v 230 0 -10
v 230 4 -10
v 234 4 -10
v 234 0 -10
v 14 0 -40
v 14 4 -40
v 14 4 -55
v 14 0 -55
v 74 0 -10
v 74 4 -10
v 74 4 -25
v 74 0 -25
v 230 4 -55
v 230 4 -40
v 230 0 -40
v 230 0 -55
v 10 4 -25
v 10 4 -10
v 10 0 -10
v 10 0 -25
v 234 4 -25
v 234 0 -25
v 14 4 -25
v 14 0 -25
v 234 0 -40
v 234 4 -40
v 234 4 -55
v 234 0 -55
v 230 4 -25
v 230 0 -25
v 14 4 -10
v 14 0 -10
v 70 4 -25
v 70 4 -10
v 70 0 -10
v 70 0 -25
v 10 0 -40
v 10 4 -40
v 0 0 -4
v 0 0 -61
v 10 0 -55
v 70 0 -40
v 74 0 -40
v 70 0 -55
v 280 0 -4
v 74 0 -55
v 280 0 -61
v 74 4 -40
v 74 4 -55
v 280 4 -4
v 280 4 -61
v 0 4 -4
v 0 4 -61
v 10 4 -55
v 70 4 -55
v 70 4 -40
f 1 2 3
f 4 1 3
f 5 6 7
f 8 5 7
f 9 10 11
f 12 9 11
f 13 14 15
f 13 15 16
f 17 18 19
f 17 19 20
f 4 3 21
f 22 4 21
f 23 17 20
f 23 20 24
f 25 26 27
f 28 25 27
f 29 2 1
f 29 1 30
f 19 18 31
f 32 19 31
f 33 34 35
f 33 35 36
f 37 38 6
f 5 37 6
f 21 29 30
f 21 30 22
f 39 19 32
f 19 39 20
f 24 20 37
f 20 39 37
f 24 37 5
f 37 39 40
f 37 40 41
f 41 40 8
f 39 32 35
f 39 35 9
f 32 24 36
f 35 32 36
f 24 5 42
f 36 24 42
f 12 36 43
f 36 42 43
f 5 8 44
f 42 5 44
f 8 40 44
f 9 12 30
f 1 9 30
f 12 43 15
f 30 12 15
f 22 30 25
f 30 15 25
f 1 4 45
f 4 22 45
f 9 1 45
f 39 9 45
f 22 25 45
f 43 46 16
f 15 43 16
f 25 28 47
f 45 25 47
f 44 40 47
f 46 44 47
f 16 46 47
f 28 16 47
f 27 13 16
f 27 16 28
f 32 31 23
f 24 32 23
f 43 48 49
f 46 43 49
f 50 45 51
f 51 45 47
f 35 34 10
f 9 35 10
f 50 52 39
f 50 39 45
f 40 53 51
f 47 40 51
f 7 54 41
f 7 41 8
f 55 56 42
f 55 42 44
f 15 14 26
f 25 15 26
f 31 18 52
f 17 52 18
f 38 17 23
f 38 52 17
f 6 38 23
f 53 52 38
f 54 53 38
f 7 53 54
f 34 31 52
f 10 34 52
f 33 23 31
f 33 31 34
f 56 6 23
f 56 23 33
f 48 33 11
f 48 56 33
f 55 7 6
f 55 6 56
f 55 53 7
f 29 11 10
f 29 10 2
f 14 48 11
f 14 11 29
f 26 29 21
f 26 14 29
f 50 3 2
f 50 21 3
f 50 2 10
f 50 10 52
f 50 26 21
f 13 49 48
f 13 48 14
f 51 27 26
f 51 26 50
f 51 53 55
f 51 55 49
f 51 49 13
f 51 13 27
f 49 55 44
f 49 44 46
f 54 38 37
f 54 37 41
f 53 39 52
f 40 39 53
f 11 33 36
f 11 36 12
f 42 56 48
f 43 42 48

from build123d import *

# Parameters (mm, degrees)
SKETCH1_W           = 280
SKETCH1_H           = 65
BOSS_EXTRUDE1_DEPTH = 4
SKETCH2_W           = 4
SKETCH2_H           = 15
CUT_EXTRUDE1_DEPTH  = 4
SKETCH3_W           = 280
SKETCH3_H           = 4
CUT_EXTRUDE2_DEPTH  = 4


with BuildPart() as part:
    # Sketch1 → Boss-Extrude1 (new body)
    with BuildSketch(Plane(origin=(0, 0, 0), x_dir=(1, 0, 0), z_dir=(0, 1, 0))):
        with Locations((140, 32.5)):
            Rectangle(SKETCH1_W, SKETCH1_H)
    extrude(amount=BOSS_EXTRUDE1_DEPTH)

    # Sketch2 → Cut-Extrude1 (cut)
    with BuildSketch(Plane(origin=(0, 4, 0), x_dir=(1, 0, 0), z_dir=(0, 1, 0))):
        with Locations((12, 47.5)):
            Rectangle(SKETCH2_W, SKETCH2_H)
        with Locations((12, 17.5)):
            Rectangle(SKETCH2_W, SKETCH2_H)
        with Locations((72, 17.5)):
            Rectangle(SKETCH2_W, SKETCH2_H)
        with Locations((72, 47.5)):
            Rectangle(SKETCH2_W, SKETCH2_H)
        with Locations((232, 47.5)):
            Rectangle(SKETCH2_W, SKETCH2_H)
        with Locations((232, 17.5)):
            Rectangle(SKETCH2_W, SKETCH2_H)
    extrude(amount=-CUT_EXTRUDE1_DEPTH, mode=Mode.SUBTRACT)

    # Sketch3 → Cut-Extrude2 (cut)
    with BuildSketch(Plane(origin=(0, 4, 0), x_dir=(1, 0, 0), z_dir=(0, 1, 0))):
        with Locations((140, 63)):
            Rectangle(SKETCH3_W, SKETCH3_H)
        with Locations((140, 2)):
            Rectangle(SKETCH3_W, SKETCH3_H)
    extrude(amount=-CUT_EXTRUDE2_DEPTH, mode=Mode.SUBTRACT)


solid = part.part
